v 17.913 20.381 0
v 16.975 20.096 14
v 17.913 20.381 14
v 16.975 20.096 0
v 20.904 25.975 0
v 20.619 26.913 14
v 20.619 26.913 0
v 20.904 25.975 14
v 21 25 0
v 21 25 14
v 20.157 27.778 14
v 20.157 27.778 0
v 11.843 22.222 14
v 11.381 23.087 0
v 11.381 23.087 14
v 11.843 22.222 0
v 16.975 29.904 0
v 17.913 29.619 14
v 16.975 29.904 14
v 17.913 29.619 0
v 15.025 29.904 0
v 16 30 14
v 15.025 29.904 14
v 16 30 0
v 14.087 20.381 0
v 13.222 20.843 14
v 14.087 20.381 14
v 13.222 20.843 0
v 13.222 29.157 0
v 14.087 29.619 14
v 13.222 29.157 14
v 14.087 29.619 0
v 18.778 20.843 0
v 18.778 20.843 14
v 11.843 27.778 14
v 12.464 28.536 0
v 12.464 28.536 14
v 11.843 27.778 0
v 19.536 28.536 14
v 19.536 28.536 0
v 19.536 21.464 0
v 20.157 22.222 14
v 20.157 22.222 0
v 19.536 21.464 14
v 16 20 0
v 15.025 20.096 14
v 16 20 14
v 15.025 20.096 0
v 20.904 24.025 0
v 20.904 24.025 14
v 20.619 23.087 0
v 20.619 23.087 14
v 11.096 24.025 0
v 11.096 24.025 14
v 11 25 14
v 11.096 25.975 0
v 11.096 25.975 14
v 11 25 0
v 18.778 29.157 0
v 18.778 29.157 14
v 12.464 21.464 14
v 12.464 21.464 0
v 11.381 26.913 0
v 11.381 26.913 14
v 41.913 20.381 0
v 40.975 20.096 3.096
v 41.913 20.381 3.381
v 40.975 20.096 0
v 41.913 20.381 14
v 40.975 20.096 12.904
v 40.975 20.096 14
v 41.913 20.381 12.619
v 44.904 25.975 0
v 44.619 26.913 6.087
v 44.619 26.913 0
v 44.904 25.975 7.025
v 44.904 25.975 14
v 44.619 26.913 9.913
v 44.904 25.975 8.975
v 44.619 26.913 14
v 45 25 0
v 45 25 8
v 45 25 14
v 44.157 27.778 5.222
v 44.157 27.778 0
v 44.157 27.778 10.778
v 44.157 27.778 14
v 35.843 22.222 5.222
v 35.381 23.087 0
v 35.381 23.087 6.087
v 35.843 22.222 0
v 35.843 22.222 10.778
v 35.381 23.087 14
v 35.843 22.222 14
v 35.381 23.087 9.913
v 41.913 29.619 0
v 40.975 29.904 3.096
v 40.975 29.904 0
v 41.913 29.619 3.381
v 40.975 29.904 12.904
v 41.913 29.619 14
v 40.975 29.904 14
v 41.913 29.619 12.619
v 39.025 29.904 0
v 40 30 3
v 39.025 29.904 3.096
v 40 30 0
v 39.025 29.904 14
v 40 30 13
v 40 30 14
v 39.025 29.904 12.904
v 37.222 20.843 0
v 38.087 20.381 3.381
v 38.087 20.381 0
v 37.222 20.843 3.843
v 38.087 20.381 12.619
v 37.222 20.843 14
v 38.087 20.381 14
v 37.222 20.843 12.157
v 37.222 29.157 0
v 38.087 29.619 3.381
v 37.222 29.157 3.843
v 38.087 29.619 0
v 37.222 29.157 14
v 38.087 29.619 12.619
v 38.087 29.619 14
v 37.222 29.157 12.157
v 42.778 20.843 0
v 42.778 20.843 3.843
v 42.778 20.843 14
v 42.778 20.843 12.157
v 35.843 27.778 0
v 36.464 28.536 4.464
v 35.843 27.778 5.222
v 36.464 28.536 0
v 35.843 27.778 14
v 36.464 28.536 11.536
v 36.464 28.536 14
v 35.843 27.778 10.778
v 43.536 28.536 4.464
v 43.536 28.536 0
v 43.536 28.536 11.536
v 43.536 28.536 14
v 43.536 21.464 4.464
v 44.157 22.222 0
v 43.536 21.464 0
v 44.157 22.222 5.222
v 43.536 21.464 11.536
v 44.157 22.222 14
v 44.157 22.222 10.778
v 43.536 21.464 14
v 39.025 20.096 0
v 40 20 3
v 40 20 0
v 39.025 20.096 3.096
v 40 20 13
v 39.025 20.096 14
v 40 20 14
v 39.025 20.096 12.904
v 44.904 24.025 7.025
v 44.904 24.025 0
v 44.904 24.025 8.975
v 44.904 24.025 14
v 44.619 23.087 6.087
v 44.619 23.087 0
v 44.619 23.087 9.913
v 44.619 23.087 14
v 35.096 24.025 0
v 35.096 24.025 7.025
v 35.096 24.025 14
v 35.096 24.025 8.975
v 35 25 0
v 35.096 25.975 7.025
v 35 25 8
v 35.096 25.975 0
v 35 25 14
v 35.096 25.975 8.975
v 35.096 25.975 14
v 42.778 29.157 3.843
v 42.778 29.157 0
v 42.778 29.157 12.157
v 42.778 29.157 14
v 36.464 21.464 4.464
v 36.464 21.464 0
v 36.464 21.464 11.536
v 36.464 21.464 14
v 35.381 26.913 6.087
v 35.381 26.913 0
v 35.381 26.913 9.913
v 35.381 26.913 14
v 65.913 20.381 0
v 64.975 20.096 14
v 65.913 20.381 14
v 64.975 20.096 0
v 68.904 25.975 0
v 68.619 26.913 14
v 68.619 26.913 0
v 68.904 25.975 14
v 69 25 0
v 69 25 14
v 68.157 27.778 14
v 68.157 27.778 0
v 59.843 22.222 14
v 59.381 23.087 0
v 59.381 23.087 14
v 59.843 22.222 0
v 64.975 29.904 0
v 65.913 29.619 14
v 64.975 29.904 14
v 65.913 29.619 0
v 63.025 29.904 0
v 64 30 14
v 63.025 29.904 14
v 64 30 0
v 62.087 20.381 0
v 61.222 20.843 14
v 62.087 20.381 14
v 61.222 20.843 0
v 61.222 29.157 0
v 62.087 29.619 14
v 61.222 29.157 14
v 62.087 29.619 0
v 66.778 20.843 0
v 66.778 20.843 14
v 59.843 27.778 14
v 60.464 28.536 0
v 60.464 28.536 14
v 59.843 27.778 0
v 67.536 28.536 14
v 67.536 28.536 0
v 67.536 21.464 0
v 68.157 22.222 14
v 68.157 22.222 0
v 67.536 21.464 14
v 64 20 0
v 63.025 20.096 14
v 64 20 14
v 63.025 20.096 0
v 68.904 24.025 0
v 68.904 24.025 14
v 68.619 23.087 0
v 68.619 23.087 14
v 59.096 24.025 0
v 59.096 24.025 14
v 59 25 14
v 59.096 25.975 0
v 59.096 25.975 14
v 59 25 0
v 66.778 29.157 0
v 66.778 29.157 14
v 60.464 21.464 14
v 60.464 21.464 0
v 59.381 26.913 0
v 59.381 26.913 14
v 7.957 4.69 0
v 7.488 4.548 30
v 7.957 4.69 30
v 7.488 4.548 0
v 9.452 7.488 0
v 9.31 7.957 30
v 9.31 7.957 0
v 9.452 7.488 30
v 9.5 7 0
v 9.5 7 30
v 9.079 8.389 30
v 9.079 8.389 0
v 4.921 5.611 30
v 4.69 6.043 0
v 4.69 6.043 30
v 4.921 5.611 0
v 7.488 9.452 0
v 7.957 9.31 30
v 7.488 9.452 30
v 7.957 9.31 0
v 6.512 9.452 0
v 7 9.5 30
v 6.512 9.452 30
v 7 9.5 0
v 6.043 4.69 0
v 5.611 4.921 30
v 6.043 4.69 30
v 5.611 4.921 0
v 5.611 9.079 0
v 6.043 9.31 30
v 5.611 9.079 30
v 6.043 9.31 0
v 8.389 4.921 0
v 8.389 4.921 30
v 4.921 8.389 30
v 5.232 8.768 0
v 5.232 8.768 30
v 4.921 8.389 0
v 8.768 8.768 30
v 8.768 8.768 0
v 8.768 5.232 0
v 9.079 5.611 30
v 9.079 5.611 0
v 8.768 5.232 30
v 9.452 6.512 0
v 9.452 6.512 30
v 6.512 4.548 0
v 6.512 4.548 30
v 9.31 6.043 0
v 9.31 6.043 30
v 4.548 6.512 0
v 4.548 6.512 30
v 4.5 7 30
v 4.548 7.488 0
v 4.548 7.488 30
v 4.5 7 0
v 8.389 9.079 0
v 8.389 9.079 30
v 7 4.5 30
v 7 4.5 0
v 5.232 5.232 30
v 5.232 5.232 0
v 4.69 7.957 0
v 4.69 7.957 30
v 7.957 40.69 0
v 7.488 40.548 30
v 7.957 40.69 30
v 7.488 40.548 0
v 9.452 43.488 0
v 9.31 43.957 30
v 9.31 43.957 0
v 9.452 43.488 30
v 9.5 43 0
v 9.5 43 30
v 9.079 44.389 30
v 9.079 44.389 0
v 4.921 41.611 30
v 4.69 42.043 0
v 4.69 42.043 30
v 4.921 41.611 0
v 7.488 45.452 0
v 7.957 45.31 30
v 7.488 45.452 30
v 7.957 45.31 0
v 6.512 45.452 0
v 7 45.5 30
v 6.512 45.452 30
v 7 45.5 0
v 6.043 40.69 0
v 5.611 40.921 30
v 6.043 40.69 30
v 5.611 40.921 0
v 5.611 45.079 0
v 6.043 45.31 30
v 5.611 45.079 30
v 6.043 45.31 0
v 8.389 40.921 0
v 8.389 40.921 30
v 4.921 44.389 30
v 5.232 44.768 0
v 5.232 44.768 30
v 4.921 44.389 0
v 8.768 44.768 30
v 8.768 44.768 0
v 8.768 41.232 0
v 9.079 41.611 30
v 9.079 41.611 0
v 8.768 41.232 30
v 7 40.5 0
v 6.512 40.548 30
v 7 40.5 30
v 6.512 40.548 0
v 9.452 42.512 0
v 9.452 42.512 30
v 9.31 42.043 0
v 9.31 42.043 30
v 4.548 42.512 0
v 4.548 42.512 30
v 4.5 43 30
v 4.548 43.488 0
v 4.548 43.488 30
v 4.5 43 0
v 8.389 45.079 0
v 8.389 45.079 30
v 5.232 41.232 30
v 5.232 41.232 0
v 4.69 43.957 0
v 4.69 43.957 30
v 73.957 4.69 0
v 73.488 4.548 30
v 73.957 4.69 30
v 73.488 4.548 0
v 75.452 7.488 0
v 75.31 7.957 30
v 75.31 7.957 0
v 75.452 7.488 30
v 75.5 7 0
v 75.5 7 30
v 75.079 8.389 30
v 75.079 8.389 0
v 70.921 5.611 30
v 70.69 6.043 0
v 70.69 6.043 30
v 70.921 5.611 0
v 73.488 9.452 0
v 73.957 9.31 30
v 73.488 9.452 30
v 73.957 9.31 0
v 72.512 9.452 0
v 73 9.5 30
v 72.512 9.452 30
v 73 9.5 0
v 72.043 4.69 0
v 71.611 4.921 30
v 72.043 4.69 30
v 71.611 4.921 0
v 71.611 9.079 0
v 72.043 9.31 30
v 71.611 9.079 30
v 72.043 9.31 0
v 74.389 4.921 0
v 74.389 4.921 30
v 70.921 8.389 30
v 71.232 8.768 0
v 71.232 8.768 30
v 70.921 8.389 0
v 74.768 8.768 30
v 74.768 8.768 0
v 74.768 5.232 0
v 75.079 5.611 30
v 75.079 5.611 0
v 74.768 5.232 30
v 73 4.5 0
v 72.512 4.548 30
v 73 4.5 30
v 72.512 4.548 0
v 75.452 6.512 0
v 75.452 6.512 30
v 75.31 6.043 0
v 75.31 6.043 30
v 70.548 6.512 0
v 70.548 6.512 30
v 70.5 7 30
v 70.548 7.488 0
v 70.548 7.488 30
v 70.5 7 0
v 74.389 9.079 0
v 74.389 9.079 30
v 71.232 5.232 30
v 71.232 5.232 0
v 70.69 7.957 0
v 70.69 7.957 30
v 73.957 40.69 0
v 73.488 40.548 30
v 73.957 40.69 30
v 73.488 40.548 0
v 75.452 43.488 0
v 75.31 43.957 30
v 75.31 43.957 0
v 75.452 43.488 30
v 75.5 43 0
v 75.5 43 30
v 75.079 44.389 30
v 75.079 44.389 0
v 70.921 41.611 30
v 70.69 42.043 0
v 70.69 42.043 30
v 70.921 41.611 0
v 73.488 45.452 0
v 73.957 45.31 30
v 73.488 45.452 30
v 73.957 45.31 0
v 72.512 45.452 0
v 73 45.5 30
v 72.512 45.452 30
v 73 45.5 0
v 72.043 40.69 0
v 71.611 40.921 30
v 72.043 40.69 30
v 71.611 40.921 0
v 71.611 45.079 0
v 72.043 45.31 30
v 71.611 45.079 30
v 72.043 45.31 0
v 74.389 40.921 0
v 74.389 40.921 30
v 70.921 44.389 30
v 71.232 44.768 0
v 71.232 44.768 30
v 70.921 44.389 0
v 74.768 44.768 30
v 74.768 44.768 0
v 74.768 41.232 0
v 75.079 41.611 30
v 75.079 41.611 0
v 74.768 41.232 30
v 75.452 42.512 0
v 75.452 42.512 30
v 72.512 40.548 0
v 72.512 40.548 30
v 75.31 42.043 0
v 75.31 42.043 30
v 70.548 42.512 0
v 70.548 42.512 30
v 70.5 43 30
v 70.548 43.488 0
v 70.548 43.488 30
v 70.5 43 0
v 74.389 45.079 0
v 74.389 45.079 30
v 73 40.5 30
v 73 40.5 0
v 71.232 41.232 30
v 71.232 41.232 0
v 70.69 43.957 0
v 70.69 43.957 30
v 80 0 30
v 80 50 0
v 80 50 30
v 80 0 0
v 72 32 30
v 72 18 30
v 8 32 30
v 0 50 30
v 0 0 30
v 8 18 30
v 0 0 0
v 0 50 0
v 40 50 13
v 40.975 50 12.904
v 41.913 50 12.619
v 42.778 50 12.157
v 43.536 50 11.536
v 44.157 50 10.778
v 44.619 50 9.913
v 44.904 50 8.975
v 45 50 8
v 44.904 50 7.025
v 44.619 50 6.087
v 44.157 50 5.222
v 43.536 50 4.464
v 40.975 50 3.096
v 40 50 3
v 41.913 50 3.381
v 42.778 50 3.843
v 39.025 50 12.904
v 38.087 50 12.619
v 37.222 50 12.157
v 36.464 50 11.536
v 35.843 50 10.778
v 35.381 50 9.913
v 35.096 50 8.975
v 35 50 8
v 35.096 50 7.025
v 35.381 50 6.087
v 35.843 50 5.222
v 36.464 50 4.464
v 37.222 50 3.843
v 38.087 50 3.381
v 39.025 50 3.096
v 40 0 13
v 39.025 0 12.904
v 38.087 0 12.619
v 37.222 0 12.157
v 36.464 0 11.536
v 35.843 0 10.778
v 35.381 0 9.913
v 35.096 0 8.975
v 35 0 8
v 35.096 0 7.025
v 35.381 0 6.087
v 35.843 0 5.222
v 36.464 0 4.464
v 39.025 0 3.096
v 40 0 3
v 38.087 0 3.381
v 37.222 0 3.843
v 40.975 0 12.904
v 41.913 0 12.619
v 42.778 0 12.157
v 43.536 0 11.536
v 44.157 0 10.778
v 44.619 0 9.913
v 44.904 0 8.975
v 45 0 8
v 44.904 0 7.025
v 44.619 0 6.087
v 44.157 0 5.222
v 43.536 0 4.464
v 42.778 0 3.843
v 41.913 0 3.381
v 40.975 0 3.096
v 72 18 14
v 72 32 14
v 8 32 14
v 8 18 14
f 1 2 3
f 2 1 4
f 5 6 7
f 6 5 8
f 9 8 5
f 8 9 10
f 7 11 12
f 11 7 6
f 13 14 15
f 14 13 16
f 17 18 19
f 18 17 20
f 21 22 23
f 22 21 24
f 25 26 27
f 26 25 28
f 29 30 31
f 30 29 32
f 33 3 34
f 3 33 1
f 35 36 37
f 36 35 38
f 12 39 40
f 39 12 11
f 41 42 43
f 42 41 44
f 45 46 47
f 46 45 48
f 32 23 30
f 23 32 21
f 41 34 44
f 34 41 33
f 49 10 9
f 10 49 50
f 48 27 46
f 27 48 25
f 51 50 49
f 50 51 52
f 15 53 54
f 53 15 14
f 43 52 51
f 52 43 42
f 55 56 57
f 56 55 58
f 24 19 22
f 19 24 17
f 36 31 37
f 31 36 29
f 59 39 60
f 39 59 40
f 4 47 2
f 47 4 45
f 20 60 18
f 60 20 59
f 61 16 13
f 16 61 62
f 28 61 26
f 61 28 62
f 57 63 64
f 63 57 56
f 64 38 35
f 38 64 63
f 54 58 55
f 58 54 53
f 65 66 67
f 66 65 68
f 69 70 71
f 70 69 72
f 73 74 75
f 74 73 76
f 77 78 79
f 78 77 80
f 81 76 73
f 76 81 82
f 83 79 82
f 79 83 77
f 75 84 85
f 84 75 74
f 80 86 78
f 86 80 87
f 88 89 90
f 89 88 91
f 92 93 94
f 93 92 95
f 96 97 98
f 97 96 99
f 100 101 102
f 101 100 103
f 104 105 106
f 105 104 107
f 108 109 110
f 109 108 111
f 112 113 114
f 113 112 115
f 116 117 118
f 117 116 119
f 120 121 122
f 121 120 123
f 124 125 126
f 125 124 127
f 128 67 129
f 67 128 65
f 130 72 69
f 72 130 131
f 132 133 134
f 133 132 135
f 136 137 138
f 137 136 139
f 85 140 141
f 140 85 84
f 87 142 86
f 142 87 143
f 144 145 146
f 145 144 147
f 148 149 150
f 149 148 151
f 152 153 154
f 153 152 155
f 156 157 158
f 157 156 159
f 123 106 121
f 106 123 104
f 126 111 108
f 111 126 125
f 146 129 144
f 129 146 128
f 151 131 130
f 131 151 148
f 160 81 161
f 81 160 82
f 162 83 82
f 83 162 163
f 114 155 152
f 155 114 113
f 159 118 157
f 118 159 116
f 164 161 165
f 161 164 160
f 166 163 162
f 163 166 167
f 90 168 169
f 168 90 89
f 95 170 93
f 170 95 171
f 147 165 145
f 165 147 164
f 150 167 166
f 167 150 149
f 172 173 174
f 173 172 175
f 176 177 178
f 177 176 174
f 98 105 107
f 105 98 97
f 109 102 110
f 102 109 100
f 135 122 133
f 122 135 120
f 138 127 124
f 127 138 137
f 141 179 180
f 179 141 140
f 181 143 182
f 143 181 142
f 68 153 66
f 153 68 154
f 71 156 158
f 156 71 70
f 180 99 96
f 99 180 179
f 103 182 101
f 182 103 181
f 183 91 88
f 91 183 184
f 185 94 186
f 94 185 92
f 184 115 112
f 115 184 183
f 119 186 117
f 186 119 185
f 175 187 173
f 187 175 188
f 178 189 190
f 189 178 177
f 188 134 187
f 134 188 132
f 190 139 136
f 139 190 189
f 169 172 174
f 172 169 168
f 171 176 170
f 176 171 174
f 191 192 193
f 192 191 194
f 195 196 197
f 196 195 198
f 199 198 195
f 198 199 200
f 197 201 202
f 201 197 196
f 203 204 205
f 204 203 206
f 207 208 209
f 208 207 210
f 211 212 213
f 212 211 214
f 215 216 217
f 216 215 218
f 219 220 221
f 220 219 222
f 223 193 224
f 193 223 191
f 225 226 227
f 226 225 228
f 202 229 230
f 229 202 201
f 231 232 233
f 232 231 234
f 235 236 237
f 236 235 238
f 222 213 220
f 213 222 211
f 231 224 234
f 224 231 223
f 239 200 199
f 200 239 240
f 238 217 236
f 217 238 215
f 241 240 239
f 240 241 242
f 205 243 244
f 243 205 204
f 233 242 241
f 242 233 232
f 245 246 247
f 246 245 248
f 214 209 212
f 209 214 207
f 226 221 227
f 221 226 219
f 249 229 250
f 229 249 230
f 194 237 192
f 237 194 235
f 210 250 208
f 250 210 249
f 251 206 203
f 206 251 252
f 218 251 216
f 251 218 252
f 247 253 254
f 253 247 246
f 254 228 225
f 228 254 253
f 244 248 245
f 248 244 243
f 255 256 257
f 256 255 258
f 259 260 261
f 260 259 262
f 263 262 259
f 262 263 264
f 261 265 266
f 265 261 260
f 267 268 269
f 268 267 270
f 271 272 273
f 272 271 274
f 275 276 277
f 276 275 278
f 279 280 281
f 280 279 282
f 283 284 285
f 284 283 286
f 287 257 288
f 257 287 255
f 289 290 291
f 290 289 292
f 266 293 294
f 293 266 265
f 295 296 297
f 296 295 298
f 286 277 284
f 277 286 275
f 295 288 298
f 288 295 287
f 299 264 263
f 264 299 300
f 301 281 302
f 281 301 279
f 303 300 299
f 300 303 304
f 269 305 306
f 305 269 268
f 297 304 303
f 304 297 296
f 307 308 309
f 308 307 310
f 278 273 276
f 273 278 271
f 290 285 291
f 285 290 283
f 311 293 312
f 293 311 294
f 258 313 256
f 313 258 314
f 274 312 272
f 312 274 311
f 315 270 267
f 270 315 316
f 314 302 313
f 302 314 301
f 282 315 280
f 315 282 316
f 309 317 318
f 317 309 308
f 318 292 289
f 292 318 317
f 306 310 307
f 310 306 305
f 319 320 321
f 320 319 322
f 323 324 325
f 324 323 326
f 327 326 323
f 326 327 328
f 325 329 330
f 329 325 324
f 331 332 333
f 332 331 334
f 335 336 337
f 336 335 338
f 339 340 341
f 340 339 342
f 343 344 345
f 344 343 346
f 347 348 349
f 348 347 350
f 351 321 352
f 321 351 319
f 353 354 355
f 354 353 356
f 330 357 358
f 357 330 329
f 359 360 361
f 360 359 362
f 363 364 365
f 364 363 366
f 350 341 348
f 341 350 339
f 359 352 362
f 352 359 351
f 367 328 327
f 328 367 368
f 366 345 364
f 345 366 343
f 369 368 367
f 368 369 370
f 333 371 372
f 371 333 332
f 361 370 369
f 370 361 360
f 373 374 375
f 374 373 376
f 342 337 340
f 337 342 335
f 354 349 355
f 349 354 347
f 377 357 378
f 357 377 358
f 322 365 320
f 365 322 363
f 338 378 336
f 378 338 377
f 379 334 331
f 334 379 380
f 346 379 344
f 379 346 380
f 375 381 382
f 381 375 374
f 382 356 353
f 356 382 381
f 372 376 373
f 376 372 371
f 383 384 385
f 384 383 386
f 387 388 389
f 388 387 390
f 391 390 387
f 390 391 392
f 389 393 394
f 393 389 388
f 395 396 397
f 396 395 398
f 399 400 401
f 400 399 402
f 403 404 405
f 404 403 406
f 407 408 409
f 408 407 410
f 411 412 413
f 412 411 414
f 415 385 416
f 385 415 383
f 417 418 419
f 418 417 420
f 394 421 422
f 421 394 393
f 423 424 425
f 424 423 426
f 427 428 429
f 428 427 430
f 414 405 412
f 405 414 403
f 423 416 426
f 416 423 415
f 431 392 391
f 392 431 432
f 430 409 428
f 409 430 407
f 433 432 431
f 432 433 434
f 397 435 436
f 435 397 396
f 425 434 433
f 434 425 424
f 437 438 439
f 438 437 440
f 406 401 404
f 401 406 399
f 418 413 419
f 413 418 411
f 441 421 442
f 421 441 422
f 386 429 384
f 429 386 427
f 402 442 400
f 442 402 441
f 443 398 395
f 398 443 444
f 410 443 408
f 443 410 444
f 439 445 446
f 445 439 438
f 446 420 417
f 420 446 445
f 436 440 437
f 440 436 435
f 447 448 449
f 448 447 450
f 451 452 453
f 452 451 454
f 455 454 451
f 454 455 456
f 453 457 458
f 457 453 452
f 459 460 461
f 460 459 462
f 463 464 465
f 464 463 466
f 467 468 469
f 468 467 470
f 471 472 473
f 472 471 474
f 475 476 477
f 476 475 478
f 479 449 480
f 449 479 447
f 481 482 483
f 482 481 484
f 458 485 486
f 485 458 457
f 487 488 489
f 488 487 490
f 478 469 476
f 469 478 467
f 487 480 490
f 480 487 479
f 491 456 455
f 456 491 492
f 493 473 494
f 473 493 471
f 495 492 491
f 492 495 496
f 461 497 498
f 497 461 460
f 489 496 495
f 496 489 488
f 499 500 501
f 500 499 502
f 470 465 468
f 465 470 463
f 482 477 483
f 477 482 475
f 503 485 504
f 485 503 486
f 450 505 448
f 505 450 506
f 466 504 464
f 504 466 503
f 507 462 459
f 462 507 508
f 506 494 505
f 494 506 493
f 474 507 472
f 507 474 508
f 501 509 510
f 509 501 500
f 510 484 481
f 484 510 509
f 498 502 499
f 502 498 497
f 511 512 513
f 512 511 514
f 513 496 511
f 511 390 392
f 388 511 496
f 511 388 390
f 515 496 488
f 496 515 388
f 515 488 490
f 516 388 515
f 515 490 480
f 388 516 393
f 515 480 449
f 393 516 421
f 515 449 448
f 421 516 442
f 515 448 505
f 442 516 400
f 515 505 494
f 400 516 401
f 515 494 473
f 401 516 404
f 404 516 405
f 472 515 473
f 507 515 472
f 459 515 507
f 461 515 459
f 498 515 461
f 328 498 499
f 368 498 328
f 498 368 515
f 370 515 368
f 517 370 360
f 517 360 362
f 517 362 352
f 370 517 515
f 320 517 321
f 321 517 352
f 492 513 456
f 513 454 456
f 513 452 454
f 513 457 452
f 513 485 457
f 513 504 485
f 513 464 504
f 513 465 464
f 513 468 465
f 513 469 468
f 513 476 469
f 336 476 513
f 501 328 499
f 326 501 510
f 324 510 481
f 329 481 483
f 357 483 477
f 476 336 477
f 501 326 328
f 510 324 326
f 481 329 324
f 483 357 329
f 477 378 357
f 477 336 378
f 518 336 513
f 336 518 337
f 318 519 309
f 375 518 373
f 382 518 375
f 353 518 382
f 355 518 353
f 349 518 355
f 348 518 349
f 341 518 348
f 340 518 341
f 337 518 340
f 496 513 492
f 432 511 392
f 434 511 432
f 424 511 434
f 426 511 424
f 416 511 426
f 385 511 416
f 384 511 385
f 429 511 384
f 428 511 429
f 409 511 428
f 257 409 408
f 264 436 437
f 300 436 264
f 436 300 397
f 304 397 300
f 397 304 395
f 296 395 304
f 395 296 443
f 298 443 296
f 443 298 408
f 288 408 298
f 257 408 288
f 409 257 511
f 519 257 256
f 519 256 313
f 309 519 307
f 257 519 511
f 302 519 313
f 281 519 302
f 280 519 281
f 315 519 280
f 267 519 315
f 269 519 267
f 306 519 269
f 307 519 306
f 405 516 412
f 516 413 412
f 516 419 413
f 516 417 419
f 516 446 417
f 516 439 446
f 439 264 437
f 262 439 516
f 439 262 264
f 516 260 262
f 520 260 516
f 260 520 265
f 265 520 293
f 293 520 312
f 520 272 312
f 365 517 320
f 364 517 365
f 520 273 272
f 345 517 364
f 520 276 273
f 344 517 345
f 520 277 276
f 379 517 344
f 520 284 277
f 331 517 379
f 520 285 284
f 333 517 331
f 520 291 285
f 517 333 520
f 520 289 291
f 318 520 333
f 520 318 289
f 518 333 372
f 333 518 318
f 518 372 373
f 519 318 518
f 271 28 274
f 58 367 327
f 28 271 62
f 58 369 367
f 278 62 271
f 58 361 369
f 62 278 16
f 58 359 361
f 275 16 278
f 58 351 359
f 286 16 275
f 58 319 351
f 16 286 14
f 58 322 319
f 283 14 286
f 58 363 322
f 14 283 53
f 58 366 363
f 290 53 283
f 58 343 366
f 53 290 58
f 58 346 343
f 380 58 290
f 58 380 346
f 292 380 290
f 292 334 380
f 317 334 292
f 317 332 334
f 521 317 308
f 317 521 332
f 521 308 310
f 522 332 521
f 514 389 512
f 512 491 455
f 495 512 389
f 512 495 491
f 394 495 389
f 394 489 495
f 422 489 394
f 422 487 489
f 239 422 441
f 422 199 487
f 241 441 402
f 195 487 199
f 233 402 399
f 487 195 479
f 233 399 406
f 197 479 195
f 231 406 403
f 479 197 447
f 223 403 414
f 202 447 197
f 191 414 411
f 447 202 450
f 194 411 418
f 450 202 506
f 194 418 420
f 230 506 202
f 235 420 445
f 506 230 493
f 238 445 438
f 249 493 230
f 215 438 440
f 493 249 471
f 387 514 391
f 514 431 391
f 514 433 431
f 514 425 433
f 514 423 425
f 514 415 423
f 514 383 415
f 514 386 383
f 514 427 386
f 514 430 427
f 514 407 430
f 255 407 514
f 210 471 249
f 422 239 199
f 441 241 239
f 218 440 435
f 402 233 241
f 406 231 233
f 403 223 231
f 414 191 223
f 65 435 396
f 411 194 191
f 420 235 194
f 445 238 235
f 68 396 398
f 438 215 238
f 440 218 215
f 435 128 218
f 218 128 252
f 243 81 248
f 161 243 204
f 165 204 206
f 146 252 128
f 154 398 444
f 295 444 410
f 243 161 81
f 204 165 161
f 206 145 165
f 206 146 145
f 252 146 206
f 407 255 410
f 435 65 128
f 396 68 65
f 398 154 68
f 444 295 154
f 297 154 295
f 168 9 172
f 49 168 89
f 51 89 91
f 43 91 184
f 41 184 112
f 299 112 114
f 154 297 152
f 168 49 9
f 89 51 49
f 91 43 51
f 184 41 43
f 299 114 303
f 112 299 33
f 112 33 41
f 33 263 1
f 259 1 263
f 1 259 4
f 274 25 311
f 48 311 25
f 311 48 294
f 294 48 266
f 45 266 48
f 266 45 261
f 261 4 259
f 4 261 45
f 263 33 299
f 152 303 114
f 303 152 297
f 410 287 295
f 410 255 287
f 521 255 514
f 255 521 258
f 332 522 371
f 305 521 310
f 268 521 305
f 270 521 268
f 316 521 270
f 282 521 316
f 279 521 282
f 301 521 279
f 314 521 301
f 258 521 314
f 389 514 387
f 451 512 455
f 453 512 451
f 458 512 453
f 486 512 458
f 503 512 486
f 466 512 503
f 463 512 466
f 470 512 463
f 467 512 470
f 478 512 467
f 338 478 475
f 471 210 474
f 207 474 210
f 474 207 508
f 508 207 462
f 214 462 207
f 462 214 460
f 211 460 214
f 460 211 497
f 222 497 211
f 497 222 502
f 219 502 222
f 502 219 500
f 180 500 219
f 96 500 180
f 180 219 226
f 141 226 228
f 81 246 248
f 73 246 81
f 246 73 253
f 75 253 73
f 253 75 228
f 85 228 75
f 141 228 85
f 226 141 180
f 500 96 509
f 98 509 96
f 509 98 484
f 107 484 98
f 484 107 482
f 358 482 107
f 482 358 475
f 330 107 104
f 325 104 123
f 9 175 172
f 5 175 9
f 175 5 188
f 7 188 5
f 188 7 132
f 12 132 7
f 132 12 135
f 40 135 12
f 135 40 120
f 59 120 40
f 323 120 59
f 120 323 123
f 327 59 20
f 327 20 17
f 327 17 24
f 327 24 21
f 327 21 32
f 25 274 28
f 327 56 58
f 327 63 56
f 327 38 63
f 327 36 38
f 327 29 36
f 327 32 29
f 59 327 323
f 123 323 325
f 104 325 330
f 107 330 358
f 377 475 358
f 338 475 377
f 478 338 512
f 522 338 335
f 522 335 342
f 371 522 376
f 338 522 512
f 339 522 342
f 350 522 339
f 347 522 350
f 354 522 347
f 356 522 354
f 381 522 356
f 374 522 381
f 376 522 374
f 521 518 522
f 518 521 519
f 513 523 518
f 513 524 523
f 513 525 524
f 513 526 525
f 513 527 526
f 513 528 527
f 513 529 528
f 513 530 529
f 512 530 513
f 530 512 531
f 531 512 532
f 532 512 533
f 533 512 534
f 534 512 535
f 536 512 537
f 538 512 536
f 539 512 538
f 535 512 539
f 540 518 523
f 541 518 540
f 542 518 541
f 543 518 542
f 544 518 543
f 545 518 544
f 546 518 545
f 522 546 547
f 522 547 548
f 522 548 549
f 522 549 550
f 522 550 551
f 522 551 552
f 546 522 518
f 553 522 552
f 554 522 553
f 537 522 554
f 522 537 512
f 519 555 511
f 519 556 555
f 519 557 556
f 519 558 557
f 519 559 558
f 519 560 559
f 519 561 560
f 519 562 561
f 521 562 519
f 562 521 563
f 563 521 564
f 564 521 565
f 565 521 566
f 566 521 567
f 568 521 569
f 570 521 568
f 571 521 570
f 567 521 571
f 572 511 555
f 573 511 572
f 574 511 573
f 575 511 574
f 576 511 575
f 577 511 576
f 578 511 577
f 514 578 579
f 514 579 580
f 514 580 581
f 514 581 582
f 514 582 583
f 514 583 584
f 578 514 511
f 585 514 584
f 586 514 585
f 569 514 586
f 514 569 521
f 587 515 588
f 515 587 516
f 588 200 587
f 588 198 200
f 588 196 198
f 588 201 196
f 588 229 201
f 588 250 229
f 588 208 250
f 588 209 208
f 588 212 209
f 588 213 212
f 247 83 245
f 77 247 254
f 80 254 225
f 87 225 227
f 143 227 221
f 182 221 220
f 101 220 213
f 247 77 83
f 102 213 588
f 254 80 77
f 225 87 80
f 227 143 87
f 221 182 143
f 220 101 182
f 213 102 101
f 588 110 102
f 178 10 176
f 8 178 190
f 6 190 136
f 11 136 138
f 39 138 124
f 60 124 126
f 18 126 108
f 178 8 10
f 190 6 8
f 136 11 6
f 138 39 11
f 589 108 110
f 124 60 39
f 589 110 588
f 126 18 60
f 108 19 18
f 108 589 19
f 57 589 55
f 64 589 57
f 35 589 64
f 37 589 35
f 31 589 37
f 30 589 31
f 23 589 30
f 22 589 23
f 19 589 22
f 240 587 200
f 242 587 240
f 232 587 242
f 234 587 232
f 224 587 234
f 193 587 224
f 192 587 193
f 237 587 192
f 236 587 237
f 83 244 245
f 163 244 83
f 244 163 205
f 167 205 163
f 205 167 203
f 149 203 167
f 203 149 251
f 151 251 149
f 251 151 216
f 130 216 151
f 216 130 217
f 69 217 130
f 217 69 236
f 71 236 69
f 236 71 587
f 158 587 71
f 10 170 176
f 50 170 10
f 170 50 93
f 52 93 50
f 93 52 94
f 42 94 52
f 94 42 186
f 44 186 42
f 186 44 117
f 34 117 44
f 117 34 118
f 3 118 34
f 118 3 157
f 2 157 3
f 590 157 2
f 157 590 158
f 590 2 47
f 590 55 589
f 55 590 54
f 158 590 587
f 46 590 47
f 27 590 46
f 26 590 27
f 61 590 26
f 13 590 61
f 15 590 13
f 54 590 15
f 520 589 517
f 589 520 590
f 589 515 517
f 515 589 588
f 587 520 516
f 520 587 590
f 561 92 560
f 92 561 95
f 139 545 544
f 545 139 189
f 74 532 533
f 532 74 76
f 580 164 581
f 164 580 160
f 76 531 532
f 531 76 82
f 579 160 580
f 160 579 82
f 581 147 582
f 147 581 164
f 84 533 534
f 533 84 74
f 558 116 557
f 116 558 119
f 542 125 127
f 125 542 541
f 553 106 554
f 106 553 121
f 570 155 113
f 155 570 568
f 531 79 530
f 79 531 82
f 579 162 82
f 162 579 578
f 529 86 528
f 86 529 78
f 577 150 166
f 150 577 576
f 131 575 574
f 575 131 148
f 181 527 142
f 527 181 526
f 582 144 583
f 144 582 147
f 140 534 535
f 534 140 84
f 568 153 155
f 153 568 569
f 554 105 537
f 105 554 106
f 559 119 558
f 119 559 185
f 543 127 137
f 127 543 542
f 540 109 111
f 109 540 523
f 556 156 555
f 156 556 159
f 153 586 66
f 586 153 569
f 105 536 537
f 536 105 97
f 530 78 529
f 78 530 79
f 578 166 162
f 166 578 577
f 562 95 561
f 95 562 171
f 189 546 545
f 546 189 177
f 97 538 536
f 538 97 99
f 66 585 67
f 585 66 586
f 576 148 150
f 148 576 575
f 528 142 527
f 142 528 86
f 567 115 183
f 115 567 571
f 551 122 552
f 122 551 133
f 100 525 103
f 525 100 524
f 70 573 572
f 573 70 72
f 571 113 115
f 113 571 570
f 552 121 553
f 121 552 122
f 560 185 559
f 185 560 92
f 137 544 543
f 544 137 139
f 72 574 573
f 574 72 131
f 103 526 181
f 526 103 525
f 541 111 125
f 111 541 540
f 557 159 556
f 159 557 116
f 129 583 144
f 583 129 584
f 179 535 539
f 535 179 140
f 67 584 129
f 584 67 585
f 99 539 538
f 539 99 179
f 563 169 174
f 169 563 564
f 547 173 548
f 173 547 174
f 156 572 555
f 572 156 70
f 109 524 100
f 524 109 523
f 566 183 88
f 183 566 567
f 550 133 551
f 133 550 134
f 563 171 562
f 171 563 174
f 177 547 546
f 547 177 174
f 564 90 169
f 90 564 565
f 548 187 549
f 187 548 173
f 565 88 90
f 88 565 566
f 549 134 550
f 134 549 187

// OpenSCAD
$fn = 32;

// ----------------------------------------------------------------------
// Manifold block: side_outlet manifold
// ----------------------------------------------------------------------

// --- parameters (mm) ---
block_l = 80;             // block length, X
block_w = 50;             // block width, Y
block_h = 30;             // block height, Z
port_d = 10;              // port bore diameter
port_pitch = 24;          // port pitch along X
gallery_d = 14;           // top gallery width, Y
gallery_depth = 16;       // gallery pocket depth
wall_p = 8;               // gallery end wall thickness, X
mnt_d = 5;                // mounting hole diameter
mnt_in = 7;               // mounting hole inset from the edges
out_d = 10;               // outlet bore diameter
out_z = 8;                // outlet axis height

n_ports = 3;  // ports in the row
port_x0 = (block_l - (n_ports - 1) * port_pitch) / 2;  // first port X

difference() {
  cube([block_l, block_w, block_h]);
  for (i = [0 : n_ports - 1])
    translate([port_x0 + i * port_pitch, block_w / 2, -1])
      cylinder(h = block_h + 2, d = port_d);
  translate([wall_p, block_w / 2 - gallery_d / 2, block_h - gallery_depth])
    cube([block_l - 2 * wall_p, gallery_d, gallery_depth + 1]);
  for (cx = [mnt_in, block_l - mnt_in])
    for (cy = [mnt_in, block_w - mnt_in])
      translate([cx, cy, -1]) cylinder(h = block_h + 2, d = mnt_d);
  translate([block_l / 2, -1, out_z]) rotate([-90, 0, 0])
    cylinder(h = block_w + 2, d = out_d);
}
